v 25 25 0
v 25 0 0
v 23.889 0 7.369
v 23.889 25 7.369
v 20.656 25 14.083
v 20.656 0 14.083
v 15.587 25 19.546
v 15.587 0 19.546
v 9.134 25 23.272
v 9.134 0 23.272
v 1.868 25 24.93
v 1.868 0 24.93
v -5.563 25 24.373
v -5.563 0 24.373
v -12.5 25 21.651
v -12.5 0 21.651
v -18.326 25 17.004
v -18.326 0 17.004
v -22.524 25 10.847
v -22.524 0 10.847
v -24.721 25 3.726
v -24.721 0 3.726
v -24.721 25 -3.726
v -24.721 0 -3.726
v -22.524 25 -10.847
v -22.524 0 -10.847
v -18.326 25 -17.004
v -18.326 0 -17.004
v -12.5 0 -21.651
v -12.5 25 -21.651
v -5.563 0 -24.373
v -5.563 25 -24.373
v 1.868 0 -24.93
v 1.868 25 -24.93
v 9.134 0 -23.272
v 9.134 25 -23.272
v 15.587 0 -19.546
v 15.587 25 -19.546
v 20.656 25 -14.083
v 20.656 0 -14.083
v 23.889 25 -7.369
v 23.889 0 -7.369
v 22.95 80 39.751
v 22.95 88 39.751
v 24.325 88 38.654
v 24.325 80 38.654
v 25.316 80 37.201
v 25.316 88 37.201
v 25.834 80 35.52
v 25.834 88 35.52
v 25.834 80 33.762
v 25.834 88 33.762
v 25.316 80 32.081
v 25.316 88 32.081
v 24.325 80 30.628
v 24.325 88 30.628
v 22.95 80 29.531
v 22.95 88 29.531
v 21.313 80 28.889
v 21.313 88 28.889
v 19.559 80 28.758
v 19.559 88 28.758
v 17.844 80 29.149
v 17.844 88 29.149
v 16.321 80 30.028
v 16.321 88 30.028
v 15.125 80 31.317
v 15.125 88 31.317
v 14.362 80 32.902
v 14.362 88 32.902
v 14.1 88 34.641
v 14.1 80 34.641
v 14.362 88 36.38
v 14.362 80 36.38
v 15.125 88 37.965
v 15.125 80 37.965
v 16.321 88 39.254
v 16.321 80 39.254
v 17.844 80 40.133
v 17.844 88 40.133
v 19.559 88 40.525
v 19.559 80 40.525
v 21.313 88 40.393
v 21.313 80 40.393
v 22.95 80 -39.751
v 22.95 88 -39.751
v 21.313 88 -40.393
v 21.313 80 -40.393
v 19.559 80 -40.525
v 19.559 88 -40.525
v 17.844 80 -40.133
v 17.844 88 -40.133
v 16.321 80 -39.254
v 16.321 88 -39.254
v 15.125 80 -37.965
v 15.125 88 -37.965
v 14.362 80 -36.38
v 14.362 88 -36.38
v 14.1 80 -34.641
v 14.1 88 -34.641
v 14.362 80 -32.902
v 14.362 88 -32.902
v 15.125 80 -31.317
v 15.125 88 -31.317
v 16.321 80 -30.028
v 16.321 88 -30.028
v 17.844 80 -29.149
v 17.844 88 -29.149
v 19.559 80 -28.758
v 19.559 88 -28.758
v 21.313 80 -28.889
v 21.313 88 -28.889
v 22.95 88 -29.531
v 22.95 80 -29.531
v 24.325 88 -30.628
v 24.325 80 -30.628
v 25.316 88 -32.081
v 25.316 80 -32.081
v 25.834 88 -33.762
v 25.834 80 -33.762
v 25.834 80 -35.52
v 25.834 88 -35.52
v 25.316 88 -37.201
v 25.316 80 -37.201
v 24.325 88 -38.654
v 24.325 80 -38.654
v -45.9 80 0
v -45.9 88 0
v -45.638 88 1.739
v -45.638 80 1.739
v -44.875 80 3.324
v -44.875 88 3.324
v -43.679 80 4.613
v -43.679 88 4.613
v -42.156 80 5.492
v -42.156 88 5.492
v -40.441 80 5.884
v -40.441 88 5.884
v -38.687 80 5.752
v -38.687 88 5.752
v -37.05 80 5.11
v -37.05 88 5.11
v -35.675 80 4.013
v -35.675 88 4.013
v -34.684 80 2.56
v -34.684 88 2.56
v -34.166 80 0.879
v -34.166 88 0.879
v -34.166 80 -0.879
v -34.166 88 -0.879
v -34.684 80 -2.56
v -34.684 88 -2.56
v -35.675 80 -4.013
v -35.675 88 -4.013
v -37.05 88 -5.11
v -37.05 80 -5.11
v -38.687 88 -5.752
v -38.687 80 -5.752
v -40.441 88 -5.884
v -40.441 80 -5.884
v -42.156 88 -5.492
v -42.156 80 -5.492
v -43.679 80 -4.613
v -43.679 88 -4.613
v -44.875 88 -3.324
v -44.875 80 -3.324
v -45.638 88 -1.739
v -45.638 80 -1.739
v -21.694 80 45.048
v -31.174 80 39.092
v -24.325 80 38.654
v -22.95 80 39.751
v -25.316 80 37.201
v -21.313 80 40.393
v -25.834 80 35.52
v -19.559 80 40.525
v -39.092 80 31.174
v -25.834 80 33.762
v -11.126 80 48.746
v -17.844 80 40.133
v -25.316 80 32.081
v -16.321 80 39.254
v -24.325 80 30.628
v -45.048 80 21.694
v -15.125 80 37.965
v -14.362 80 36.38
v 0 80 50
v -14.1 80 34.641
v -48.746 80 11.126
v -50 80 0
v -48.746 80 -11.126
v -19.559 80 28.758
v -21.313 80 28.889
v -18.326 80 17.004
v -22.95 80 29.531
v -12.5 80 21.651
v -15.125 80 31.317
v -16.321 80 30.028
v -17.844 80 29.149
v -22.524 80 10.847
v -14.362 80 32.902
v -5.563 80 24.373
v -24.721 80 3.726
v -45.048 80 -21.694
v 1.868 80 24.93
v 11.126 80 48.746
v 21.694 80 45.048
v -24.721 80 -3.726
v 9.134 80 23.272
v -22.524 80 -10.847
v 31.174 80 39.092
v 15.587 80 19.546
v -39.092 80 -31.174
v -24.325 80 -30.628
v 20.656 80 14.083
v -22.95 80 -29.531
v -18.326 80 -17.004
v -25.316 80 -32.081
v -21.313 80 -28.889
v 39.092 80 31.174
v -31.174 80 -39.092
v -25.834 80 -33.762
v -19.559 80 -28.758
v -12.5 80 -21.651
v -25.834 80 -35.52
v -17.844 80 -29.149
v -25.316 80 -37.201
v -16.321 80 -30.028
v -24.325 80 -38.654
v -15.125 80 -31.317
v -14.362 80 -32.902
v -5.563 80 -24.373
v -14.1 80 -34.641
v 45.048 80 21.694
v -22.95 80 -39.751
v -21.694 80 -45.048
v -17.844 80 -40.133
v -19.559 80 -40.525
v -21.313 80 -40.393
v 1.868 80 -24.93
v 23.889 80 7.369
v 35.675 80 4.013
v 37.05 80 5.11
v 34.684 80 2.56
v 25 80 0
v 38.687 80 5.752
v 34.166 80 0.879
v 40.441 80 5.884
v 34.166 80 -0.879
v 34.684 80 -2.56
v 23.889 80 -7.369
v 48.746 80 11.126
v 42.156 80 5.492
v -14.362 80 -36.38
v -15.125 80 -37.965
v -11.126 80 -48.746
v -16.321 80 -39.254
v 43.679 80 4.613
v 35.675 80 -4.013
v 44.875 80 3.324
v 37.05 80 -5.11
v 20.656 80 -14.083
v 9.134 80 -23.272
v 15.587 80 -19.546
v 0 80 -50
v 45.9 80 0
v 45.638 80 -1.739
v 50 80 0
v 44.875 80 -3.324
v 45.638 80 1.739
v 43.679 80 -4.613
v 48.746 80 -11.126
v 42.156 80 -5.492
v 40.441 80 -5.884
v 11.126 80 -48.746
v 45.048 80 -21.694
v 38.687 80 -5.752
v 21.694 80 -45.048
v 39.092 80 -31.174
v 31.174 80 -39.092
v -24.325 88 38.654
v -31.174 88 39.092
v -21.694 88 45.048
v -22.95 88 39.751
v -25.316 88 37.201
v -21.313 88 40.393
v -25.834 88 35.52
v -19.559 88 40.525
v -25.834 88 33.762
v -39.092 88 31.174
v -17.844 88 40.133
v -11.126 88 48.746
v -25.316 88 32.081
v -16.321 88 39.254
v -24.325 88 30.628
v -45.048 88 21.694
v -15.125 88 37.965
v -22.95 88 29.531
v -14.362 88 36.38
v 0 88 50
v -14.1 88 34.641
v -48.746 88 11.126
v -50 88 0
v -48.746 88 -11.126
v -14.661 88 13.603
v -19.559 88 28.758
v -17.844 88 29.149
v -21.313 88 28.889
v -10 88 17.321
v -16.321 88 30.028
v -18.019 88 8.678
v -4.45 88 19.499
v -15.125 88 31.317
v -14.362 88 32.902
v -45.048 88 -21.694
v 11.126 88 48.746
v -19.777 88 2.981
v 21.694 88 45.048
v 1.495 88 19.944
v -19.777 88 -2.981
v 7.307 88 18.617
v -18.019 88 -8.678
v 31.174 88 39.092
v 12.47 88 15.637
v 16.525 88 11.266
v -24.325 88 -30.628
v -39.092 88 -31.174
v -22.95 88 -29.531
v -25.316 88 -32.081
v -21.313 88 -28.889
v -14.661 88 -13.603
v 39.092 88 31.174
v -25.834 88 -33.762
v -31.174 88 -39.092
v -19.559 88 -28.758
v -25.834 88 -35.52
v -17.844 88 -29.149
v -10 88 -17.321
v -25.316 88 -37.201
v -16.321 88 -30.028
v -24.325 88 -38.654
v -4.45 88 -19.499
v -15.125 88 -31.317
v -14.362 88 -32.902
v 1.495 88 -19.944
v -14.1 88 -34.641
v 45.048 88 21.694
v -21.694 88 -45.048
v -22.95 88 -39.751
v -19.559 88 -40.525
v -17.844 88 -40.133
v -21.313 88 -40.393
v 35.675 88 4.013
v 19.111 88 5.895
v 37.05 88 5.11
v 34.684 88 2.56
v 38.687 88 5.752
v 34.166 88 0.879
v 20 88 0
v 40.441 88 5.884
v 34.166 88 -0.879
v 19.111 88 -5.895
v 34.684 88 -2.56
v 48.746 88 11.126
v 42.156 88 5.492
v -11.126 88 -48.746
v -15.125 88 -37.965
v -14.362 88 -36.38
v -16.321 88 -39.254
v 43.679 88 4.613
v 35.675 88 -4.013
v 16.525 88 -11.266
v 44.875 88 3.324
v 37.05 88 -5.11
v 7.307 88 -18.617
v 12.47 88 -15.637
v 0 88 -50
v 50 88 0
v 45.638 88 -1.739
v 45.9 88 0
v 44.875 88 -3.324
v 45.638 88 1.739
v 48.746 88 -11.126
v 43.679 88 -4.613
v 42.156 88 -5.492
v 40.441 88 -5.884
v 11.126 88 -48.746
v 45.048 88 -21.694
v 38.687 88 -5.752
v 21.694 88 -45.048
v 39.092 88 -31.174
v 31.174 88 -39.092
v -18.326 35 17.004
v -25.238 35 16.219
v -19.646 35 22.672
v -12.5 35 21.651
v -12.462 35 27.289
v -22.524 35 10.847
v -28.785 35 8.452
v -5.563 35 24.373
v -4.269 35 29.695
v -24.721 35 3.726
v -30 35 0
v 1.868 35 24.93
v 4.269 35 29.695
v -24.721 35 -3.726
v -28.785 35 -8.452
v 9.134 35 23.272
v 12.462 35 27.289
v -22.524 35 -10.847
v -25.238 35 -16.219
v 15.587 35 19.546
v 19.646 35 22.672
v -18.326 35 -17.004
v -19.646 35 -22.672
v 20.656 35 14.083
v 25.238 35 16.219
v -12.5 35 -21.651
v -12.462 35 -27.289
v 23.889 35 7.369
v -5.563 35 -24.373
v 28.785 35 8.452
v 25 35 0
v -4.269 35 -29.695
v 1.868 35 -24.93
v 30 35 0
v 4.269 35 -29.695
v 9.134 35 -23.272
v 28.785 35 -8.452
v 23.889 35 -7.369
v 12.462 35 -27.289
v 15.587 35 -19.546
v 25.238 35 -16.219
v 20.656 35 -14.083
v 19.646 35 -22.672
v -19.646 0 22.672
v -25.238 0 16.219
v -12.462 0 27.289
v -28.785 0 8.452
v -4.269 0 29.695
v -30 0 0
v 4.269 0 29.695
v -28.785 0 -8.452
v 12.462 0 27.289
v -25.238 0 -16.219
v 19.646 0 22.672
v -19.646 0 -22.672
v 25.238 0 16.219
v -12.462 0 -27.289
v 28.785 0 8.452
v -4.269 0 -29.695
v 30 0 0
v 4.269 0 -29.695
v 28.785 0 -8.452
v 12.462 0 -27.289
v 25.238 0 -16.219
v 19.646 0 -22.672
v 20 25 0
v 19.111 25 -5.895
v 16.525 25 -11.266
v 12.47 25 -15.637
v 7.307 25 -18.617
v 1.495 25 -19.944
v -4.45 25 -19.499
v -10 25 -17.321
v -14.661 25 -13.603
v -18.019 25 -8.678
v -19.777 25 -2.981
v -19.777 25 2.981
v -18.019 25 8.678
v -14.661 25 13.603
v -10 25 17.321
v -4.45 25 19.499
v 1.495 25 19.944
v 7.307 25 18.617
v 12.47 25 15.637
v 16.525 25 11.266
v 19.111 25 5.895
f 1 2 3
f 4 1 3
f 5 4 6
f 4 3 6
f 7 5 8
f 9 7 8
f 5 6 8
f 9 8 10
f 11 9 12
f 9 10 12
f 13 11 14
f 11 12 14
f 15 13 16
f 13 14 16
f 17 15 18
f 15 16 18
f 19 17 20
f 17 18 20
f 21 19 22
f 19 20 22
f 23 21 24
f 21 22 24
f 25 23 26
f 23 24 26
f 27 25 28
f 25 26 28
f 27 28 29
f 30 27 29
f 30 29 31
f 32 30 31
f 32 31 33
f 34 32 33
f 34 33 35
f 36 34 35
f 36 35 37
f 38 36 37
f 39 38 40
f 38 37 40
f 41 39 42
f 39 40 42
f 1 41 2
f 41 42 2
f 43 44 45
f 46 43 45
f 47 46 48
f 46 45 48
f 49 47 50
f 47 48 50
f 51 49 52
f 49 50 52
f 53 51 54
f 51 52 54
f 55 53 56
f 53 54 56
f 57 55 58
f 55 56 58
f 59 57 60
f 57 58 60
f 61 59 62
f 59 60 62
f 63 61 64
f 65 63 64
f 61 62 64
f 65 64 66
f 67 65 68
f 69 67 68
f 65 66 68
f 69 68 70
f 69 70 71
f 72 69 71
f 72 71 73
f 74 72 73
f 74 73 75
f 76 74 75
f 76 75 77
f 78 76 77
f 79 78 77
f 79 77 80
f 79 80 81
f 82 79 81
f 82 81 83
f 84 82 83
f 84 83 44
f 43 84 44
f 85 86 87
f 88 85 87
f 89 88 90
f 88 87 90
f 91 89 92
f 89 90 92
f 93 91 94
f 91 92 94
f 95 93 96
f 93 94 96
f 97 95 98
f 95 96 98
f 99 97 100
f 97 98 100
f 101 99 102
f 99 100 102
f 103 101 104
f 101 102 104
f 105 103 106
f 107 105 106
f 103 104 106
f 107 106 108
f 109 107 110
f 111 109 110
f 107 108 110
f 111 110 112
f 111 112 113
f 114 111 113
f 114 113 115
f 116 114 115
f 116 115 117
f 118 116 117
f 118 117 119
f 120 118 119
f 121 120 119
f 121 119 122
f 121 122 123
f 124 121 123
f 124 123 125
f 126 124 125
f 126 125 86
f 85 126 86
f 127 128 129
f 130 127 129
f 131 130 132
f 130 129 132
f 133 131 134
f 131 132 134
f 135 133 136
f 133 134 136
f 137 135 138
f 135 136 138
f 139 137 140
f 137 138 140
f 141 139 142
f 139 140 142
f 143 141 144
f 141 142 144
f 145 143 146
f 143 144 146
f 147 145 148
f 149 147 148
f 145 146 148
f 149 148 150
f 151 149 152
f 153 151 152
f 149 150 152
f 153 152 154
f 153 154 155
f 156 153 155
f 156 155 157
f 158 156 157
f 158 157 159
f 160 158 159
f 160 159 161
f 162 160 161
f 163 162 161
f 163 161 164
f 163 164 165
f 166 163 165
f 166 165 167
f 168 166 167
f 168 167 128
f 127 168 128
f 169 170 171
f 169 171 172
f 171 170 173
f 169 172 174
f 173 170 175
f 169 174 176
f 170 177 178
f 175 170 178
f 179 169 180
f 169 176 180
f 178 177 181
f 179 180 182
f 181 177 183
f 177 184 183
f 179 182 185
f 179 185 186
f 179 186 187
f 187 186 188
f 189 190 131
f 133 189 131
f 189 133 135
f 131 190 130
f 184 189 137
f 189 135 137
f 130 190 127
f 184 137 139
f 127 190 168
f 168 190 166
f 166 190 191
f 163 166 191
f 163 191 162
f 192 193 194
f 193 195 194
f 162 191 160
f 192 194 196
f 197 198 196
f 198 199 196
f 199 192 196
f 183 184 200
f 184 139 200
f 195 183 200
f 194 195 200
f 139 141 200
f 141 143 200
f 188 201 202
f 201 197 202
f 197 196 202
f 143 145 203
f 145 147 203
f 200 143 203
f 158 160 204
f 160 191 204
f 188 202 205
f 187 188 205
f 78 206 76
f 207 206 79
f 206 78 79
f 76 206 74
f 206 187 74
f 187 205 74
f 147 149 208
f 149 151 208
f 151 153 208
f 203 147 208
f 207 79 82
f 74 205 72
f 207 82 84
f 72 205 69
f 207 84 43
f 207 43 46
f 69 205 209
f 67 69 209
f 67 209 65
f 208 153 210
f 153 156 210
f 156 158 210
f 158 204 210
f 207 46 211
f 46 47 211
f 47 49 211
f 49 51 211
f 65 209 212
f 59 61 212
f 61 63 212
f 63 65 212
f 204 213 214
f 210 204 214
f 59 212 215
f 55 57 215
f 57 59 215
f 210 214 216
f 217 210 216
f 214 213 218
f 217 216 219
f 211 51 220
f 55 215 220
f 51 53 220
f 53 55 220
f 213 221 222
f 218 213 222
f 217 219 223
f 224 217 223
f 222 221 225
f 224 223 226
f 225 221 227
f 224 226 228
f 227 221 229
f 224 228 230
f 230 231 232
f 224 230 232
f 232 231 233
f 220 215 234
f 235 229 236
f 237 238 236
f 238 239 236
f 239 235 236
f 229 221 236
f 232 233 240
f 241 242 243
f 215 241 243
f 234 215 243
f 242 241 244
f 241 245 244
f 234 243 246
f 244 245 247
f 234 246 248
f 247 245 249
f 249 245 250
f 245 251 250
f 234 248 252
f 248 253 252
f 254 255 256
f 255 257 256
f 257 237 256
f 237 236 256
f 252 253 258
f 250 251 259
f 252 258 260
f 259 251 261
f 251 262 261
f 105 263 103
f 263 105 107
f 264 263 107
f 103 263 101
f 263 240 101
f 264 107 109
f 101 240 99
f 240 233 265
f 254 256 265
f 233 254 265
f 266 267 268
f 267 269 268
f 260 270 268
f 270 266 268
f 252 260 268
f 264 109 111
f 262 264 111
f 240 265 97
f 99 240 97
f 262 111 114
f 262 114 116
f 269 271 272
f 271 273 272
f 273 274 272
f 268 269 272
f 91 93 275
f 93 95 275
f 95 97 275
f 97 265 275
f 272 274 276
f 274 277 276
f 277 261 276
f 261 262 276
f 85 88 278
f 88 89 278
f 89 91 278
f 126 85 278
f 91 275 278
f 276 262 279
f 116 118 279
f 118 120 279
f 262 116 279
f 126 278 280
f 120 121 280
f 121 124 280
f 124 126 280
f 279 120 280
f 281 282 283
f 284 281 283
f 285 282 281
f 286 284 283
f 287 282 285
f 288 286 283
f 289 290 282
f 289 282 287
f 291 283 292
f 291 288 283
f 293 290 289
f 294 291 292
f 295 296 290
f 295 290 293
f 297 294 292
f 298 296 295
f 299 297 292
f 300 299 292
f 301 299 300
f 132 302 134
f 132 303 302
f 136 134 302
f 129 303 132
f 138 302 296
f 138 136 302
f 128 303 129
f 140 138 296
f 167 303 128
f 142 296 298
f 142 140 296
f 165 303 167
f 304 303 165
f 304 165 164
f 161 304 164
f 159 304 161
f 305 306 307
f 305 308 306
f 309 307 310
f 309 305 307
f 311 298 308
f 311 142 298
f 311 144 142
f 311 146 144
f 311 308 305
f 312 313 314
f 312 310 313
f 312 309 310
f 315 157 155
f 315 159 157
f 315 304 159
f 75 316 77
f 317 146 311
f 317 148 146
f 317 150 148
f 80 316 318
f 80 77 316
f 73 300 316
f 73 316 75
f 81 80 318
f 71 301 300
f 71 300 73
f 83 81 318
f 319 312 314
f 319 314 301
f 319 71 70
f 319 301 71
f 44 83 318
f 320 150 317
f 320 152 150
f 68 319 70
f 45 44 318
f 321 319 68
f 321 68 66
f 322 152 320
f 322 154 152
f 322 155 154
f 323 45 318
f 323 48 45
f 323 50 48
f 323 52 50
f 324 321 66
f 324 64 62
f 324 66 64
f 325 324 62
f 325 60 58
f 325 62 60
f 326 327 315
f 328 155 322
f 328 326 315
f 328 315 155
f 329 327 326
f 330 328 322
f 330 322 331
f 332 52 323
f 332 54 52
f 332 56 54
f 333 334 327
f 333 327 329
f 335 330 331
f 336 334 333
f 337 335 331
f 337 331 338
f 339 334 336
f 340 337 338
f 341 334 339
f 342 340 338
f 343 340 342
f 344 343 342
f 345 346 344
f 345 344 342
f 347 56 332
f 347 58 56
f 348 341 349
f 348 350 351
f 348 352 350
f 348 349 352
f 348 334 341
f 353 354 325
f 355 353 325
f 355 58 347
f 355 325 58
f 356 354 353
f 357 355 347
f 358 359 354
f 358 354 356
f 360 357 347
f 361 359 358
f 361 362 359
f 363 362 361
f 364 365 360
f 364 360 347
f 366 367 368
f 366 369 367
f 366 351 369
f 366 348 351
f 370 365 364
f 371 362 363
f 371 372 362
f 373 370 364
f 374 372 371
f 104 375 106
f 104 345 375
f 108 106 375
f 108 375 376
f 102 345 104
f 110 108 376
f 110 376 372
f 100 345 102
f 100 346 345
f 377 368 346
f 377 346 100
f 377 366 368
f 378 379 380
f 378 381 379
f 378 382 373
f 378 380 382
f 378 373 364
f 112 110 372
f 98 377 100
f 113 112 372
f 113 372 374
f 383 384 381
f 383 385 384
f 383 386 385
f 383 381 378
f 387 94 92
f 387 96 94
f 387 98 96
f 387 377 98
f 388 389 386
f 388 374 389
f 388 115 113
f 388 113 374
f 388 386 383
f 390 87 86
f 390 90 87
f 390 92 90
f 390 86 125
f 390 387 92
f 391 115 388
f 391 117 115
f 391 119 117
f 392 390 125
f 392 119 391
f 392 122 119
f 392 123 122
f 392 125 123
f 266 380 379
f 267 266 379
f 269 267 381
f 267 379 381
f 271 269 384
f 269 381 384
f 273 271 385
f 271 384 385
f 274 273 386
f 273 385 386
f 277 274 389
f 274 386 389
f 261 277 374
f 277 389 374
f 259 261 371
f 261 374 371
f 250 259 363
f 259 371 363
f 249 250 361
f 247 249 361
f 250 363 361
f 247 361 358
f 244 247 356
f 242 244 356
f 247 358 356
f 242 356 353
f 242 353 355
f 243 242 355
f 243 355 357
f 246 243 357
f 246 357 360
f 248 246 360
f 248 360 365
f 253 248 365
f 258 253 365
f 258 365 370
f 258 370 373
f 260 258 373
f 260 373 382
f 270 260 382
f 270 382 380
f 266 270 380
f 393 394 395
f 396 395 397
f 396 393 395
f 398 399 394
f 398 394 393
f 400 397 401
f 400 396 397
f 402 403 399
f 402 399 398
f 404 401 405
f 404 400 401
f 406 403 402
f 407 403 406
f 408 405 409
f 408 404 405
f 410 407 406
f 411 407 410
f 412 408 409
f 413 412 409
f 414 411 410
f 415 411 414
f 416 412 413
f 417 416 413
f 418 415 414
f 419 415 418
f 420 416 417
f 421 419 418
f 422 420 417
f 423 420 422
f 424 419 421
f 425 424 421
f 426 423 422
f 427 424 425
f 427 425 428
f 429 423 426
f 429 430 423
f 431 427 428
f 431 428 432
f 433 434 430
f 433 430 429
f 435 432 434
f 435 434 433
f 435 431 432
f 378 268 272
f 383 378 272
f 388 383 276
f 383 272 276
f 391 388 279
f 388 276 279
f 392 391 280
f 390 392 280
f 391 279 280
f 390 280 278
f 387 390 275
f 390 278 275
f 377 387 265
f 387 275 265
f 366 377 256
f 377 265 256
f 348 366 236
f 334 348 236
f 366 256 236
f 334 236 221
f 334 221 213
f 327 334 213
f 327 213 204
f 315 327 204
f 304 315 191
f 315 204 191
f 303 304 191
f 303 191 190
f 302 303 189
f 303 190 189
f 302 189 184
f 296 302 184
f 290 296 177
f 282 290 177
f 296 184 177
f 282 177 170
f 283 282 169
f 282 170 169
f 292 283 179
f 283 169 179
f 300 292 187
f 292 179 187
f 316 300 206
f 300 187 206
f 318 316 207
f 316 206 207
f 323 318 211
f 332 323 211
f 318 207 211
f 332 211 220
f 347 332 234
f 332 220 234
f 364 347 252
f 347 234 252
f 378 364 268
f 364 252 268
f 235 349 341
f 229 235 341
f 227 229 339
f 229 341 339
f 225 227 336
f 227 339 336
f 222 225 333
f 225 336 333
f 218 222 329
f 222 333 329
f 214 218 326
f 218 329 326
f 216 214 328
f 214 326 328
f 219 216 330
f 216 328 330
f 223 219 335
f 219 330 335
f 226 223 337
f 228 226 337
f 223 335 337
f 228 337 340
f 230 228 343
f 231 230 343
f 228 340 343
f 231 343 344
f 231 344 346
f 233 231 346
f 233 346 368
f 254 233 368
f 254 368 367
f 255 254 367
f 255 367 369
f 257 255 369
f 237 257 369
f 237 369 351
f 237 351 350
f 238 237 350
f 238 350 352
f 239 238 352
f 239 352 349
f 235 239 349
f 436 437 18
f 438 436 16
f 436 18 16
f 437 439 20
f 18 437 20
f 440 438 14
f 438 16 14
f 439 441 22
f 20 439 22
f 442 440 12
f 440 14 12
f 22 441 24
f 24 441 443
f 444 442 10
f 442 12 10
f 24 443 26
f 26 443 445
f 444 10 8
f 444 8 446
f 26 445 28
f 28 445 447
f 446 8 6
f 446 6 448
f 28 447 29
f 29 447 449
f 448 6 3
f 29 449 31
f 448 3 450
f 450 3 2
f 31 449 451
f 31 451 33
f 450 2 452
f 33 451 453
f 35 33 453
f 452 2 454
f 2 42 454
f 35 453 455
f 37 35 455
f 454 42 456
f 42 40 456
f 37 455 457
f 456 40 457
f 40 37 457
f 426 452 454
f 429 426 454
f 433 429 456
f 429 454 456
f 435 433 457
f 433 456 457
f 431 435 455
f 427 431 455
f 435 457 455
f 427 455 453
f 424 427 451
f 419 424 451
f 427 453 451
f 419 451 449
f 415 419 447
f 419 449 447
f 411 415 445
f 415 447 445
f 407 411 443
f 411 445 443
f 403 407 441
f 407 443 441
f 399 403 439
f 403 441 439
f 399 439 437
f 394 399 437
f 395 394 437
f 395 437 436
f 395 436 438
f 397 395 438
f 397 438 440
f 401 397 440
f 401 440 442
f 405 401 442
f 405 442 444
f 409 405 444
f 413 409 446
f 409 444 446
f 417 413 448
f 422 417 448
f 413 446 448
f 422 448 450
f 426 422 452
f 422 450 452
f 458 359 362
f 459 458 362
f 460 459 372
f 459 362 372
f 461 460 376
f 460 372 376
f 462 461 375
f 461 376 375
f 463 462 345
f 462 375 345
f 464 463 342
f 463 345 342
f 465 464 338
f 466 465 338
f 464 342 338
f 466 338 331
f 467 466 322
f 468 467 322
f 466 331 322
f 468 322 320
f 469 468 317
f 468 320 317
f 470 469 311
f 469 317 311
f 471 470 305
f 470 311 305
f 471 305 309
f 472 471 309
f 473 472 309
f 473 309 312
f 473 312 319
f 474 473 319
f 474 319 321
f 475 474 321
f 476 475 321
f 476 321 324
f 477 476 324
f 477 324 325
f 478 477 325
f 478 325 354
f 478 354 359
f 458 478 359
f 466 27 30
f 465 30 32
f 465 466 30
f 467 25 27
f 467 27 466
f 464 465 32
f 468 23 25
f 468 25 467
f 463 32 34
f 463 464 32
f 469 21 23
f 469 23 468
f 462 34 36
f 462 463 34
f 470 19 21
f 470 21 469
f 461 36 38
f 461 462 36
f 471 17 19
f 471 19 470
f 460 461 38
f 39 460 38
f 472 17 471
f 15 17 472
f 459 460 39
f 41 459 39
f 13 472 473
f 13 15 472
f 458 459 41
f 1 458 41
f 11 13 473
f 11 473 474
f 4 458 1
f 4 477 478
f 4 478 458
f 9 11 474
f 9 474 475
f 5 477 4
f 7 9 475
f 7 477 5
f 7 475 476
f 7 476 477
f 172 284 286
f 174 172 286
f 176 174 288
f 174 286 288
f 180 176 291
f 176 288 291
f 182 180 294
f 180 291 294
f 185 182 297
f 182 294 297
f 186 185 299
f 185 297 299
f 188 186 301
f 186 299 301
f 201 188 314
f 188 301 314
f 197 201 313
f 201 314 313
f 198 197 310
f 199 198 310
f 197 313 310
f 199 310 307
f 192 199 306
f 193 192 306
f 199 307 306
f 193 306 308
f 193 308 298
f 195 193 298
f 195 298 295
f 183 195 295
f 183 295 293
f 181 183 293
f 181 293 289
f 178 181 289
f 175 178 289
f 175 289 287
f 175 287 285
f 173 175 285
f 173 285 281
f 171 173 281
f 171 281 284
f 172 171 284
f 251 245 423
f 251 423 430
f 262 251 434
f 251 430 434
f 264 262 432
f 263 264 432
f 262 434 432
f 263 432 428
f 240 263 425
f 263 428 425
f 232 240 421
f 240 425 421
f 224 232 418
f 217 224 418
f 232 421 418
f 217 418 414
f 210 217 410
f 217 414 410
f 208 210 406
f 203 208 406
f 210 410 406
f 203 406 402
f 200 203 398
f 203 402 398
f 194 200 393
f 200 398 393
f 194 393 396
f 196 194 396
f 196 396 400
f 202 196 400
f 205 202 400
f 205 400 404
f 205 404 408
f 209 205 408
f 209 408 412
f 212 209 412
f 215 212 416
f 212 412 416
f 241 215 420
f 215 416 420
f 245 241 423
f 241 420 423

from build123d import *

# Parameters (mm, degrees)
SKETCH2_R           = 30
BOSS_EXTRUDE1_DEPTH = 35
SKETCH3_R           = 25
BOSS_EXTRUDE2_DEPTH = 45
SKETCH4_R           = 50
BOSS_EXTRUDE3_DEPTH = 8
SKETCH5_R           = 25
CUT_EXTRUDE1_DEPTH  = 25
CUT_EXTRUDE2_REACH  = 90
SKETCH6_R           = 20
SKETCH7_R           = 5.9
CUT_EXTRUDE3_DEPTH  = 40
CIRPATTERN1_COUNT   = 6


with BuildPart() as part:
    # Sketch2 → Boss-Extrude1 (new body)
    with BuildSketch(Plane(origin=(0, 0, 0), x_dir=(1, 0, 0), z_dir=(0, 1, 0))):
        Circle(SKETCH2_R)
    extrude(amount=BOSS_EXTRUDE1_DEPTH)

    # Sketch3 → Boss-Extrude2 (add)
    with BuildSketch(Plane(origin=(0, 35, 0), x_dir=(1, 0, 0), z_dir=(0, 1, 0))):
        Circle(SKETCH3_R)
    extrude(amount=BOSS_EXTRUDE2_DEPTH)

    # Sketch4 → Boss-Extrude3 (add)
    with BuildSketch(Plane(origin=(0, 80, 0), x_dir=(1, 0, 0), z_dir=(0, 1, 0))):
        Circle(SKETCH4_R)
    extrude(amount=BOSS_EXTRUDE3_DEPTH)

    # Sketch5 → Cut-Extrude1 (cut)
    with BuildSketch(Plane.XZ):
        Circle(SKETCH5_R)
    extrude(amount=-CUT_EXTRUDE1_DEPTH, mode=Mode.SUBTRACT)

    # Sketch6 → Cut-Extrude2 (cut, up to next)
    with BuildSketch(Plane(origin=(0, 88, 0), x_dir=(1, 0, 0), z_dir=(0, 1, 0)), mode=Mode.PRIVATE) as cut_extrude2_sk1:
        Circle(SKETCH6_R)
    cut_extrude2_tool1 = extrude(cut_extrude2_sk1.sketch, amount=-CUT_EXTRUDE2_REACH, mode=Mode.PRIVATE) & part.part
    add(cut_extrude2_tool1.solids().sort_by_distance((0, 88, 0))[0], mode=Mode.SUBTRACT)

    # Sketch7 → Cut-Extrude3 (cut)
    with BuildSketch(Plane(origin=(0, 88, 0), x_dir=(1, 0, 0), z_dir=(0, 1, 0))):
        with Locations((40, 0)):
            Circle(SKETCH7_R)
    cut_extrude3 = extrude(amount=-CUT_EXTRUDE3_DEPTH, mode=Mode.SUBTRACT)

    # CirPattern1: Cut-Extrude3 ×6 about axis
    cirpattern1_axis = Axis((0, 0, 0), (0, 1, 0))
    for i in range(1, CIRPATTERN1_COUNT):
        add(cut_extrude3.rotate(cirpattern1_axis, i * 360 / CIRPATTERN1_COUNT), mode=Mode.SUBTRACT)


solid = part.part
